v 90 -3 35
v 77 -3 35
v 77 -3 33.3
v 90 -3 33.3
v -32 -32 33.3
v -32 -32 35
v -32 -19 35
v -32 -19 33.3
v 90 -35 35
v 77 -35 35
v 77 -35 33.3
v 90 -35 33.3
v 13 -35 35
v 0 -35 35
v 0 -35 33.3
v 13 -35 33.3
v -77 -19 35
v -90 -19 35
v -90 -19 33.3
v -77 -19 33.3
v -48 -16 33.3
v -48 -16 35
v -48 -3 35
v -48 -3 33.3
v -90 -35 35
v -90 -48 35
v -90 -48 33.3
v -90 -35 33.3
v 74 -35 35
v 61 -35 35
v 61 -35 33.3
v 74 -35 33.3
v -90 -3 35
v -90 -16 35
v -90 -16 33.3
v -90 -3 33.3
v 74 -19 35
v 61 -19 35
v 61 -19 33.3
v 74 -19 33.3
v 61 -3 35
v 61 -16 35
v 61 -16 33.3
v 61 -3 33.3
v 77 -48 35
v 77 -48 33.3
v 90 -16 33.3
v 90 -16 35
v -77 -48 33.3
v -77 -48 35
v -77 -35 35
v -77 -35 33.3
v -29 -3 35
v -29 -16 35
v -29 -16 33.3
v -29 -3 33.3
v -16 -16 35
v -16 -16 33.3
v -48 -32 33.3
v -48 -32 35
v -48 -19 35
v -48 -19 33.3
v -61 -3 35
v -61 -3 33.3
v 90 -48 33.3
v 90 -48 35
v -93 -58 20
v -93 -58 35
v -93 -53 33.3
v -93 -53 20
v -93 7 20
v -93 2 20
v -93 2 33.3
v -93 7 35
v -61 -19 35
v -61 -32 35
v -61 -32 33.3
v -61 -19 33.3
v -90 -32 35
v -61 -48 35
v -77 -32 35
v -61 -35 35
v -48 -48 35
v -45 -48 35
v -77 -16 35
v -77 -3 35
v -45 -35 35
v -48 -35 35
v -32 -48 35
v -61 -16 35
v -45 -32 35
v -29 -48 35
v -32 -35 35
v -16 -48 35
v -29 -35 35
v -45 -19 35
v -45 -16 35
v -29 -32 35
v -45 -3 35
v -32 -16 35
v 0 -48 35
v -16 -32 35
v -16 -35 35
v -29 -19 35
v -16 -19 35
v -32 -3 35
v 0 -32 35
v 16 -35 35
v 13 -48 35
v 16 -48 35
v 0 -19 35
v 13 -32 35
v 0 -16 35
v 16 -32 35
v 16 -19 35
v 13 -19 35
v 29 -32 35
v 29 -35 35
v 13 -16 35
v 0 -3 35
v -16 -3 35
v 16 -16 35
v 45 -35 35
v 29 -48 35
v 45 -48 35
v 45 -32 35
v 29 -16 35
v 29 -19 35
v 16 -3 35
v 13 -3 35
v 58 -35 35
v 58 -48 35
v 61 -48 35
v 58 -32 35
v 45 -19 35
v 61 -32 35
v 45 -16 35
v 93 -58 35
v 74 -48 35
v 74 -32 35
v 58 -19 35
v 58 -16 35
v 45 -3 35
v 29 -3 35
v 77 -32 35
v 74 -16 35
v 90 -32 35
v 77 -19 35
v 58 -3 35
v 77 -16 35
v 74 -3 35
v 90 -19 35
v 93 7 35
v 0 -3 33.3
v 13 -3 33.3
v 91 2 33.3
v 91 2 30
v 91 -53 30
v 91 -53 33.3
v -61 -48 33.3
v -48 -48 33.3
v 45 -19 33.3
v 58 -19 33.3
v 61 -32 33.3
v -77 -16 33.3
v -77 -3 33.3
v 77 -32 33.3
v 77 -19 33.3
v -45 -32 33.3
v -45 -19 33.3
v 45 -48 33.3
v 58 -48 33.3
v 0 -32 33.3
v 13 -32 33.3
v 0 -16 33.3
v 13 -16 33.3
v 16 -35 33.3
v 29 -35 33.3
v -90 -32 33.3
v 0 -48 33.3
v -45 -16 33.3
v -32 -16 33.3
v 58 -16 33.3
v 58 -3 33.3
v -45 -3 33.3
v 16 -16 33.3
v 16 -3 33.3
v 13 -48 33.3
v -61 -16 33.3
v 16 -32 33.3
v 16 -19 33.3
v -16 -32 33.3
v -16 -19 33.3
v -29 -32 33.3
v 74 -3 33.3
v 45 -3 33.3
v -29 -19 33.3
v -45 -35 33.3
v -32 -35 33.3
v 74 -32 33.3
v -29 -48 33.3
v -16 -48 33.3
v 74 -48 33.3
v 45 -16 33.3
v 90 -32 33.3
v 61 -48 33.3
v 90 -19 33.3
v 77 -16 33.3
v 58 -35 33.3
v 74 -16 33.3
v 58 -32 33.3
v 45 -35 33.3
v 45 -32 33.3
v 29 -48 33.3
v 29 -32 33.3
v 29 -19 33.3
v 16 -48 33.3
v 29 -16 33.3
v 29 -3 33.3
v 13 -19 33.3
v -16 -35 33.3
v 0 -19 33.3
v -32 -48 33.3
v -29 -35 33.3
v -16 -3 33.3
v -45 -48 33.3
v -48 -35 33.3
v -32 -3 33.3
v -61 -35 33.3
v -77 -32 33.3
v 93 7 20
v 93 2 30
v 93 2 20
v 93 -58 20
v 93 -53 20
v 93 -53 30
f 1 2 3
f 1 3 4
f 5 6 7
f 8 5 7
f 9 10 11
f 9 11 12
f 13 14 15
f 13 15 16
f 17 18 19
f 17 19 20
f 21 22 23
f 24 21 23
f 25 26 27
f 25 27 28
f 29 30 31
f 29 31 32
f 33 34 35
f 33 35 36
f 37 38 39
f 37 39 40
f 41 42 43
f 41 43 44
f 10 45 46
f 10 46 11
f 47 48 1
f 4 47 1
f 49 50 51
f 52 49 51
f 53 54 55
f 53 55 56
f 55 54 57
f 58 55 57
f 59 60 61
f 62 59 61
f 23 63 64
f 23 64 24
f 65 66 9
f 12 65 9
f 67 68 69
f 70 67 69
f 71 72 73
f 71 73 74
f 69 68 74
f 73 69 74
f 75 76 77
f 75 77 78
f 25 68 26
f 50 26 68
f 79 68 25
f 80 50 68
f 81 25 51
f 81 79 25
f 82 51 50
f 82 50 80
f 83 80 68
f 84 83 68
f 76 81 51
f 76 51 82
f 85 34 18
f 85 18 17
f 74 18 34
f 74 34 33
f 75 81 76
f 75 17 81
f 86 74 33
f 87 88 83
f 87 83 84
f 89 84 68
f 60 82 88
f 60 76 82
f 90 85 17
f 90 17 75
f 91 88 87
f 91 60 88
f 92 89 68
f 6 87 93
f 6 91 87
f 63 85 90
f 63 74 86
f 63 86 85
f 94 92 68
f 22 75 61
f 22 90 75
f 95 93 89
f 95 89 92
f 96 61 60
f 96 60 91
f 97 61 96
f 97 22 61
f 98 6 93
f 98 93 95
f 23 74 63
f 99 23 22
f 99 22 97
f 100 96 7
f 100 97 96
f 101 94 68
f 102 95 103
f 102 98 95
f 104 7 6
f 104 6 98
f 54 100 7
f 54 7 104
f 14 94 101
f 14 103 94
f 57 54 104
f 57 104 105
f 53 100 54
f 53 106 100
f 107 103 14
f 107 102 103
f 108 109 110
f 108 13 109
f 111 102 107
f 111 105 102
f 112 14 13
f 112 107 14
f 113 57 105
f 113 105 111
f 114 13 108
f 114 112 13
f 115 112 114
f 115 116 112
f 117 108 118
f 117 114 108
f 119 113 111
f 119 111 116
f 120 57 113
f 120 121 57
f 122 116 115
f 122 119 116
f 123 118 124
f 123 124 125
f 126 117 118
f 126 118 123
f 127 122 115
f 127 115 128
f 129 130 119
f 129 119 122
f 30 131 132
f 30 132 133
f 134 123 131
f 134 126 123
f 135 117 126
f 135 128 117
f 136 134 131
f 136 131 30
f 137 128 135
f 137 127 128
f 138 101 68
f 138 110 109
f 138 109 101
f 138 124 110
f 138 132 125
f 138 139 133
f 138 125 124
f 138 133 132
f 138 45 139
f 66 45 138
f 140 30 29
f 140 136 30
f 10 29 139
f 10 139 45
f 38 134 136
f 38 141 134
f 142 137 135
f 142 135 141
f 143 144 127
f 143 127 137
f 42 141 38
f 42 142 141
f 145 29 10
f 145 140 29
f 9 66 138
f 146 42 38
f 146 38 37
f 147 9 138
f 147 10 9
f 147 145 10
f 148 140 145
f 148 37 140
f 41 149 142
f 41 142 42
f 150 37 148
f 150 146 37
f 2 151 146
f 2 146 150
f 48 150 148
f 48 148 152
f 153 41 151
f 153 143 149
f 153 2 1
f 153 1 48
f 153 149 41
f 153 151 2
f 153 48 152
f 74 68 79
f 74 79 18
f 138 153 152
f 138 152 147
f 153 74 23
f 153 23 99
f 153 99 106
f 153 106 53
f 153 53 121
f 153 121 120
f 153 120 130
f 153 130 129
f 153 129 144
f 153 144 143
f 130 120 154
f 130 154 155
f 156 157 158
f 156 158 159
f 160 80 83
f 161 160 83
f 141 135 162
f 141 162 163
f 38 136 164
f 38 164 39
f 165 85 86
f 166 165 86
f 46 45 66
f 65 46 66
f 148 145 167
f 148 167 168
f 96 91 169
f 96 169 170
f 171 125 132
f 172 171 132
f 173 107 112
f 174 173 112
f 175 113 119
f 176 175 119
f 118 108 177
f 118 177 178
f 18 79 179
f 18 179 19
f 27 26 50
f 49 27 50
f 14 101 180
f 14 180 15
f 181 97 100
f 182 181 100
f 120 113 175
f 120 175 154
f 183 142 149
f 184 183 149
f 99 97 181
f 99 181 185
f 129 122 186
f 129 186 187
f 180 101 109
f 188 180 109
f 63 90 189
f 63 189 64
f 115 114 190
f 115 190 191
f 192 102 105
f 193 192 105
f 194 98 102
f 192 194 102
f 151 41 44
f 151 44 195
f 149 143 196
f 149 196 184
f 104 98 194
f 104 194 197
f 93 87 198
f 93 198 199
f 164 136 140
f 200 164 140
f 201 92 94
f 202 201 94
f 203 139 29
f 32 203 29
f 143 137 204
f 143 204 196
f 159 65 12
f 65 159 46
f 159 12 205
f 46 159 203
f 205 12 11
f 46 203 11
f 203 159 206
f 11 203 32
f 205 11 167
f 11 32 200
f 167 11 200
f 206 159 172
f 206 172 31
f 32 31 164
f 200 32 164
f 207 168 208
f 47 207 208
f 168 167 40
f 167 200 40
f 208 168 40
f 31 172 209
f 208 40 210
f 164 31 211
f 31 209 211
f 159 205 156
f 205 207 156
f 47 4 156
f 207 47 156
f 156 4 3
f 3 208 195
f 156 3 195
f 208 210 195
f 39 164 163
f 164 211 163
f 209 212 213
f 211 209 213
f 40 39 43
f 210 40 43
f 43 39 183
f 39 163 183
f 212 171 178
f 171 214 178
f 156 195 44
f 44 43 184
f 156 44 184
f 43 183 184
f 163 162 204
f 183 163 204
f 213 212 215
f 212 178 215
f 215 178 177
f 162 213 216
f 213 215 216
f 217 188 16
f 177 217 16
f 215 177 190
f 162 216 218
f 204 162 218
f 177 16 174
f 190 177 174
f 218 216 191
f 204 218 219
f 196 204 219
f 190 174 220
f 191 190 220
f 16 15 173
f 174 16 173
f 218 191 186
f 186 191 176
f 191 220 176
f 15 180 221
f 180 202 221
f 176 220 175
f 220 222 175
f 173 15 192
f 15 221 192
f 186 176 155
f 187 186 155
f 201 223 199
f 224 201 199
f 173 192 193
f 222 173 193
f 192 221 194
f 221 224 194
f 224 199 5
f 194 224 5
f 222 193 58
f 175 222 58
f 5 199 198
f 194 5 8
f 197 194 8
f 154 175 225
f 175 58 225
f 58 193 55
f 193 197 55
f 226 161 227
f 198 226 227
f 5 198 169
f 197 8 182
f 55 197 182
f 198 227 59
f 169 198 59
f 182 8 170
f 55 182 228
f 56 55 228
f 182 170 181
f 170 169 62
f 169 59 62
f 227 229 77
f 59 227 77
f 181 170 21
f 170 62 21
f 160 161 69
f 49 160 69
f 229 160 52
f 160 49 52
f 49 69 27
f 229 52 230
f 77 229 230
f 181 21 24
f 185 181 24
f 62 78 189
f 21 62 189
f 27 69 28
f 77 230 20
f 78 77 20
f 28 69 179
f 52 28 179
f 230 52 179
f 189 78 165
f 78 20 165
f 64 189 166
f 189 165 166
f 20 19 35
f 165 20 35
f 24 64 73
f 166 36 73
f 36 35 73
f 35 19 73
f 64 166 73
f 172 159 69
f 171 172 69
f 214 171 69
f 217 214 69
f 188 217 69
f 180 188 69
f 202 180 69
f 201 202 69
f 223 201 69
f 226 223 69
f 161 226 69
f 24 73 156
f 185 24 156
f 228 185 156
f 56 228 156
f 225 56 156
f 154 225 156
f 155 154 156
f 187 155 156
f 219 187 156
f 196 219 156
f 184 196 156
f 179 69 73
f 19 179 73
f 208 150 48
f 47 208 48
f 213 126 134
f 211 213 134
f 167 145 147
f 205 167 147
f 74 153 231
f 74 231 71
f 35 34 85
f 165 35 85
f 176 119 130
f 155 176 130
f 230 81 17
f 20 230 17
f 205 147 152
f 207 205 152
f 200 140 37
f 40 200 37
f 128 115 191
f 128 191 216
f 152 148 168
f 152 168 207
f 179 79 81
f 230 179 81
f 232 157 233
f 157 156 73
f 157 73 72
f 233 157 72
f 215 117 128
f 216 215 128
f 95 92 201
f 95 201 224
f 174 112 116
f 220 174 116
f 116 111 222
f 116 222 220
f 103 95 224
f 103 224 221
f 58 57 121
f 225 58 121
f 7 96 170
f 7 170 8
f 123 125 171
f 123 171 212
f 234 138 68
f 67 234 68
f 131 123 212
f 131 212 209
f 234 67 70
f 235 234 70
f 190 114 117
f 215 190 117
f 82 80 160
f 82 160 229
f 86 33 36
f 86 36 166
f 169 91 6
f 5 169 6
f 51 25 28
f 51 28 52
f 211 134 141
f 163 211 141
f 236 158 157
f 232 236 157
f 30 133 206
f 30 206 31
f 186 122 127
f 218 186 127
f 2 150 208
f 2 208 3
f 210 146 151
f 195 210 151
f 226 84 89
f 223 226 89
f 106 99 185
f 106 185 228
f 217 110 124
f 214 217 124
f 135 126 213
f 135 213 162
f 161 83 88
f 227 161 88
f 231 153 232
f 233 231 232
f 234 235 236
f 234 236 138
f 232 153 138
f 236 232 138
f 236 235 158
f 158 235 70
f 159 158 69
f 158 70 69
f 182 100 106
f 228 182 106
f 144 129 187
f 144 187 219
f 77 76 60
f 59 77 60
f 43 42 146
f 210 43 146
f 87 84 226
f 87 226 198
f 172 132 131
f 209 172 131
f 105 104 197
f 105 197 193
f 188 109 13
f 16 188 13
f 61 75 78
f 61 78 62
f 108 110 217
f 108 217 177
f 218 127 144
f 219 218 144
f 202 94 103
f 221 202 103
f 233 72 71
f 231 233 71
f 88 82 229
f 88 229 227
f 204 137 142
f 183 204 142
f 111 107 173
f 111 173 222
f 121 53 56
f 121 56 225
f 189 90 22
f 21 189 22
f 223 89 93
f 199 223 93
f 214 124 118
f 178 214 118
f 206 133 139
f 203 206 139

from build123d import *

# Parameters (mm, degrees)
ESQUISSE1_W                     = 186
ESQUISSE1_H                     = 51
BOSS_EXTRU_1_DEPTH              = 35
ESQUISSE7_W                     = 13
ESQUISSE7_H                     = 13
ENL_V_MAT_EXTRU_5_DEPTH         = 91
R_P_TITION_LIN_AIRE5_COUNT      = 3
R_P_TITION_LIN_AIRE5_PITCH      = 16
ESQUISSE8_W                     = 13
ESQUISSE8_H                     = 13
ENL_V_MAT_EXTRU_6_DEPTH         = 103
R_P_TITION_LIN_AIRE6_COUNT      = 3
R_P_TITION_LIN_AIRE6_PITCH      = 16
R_P_TITION_LIN_AIRE6_COUNT_DIR2 = 3
R_P_TITION_LIN_AIRE6_PITCH_DIR2 = 16
ESQUISSE9_W                     = 13
ESQUISSE9_H                     = 13
ENL_V_MAT_EXTRU_7_DEPTH         = 77
R_P_TITION_LIN_AIRE7_COUNT      = 3
R_P_TITION_LIN_AIRE7_PITCH      = 16
R_P_TITION_LIN_AIRE7_COUNT_DIR2 = 2
R_P_TITION_LIN_AIRE7_PITCH_DIR2 = 16
ESQUISSE10_W                    = 13
ESQUISSE10_H                    = 13
ENL_V_MAT_EXTRU_8_DEPTH         = 78
R_P_TITION_LIN_AIRE8_COUNT      = 3
R_P_TITION_LIN_AIRE8_PITCH      = 16
R_P_TITION_LIN_AIRE8_COUNT_DIR2 = 3
R_P_TITION_LIN_AIRE8_PITCH_DIR2 = 16
ESQUISSE14_W                    = 10
ESQUISSE14_H                    = 5
BOSS_EXTRU_3_DEPTH              = 7
ESQUISSE25_W                    = 186
ESQUISSE25_H                    = 35
BOSS_EXTRU_7_DEPTH              = 7
ESQUISSE18_W                    = 186
ESQUISSE18_H                    = 35
BOSS_EXTRU_5_DEPTH              = 7
ESQUISSE16_W                    = 3.3
ESQUISSE16_H                    = 55
ENL_V_MAT_EXTRU_11_DEPTH        = 184
ESQUISSE15_R                    = 1
ENL_V_MAT_EXTRU_10_DEPTH        = 7
ESQUISSE24_W                    = 10
ESQUISSE24_H                    = 2
ENL_V_MAT_EXTRU_12_DEPTH        = 1
ESQUISSE19_W                    = 186
ESQUISSE19_H                    = 1
ESQUISSE19_W_2                  = 1
ESQUISSE19_H_2                  = 63
BOSS_EXTRU_8_DEPTH              = 30
ESQUISSE26_R                    = 1.75
ENL_V_MAT_EXTRU_14_DEPTH        = 30
ESQUISSE27_R                    = 1.75
ENL_V_MAT_EXTRU_20_DEPTH        = 198.952014387


with BuildPart() as part:
    # Esquisse1 → Boss.-Extru.1 (new body)
    with BuildSketch(Plane.XY):
        with Locations((0, -25.5)):
            Rectangle(ESQUISSE1_W, ESQUISSE1_H)
    extrude(amount=BOSS_EXTRU_1_DEPTH)

    # Esquisse7 → Enlèv. mat.-Extru.5 (cut)
    with BuildSketch(Plane.XY.offset(35)):
        with Locations((-83.5, -9.5)):
            Rectangle(ESQUISSE7_W, ESQUISSE7_H)
    enl_v_mat_extru_5 = extrude(amount=-ENL_V_MAT_EXTRU_5_DEPTH, mode=Mode.SUBTRACT)

    # Répétition linéaire5: Enlèv. mat.-Extru.5 ×3
    with Locations(*[(0, -i * R_P_TITION_LIN_AIRE5_PITCH, 0) for i in range(1, R_P_TITION_LIN_AIRE5_COUNT)]):
        add(enl_v_mat_extru_5, mode=Mode.SUBTRACT)

    # Esquisse8 → Enlèv. mat.-Extru.6 (cut)
    with BuildSketch(Plane.XY.offset(35)):
        with Locations((-54.5, -9.5)):
            Rectangle(ESQUISSE8_W, ESQUISSE8_H)
    enl_v_mat_extru_6 = extrude(amount=-ENL_V_MAT_EXTRU_6_DEPTH, mode=Mode.SUBTRACT)

    # Répétition linéaire6: Enl_v. mat.-Extru.6 3 × 3
    with Locations(*[(j * R_P_TITION_LIN_AIRE6_PITCH_DIR2, -i * R_P_TITION_LIN_AIRE6_PITCH, 0) for i in range(R_P_TITION_LIN_AIRE6_COUNT) for j in range(R_P_TITION_LIN_AIRE6_COUNT_DIR2) if (i, j) != (0, 0)]):
        add(enl_v_mat_extru_6, mode=Mode.SUBTRACT)

    # Esquisse9 → Enlèv. mat.-Extru.7 (cut)
    with BuildSketch(Plane.XY.offset(35)):
        with Locations((6.5, -9.5)):
            Rectangle(ESQUISSE9_W, ESQUISSE9_H)
    enl_v_mat_extru_7 = extrude(amount=-ENL_V_MAT_EXTRU_7_DEPTH, mode=Mode.SUBTRACT)

    # Répétition linéaire7: Enl_v. mat.-Extru.7 3 × 2
    with Locations(*[(j * R_P_TITION_LIN_AIRE7_PITCH_DIR2, -i * R_P_TITION_LIN_AIRE7_PITCH, 0) for i in range(R_P_TITION_LIN_AIRE7_COUNT) for j in range(R_P_TITION_LIN_AIRE7_COUNT_DIR2) if (i, j) != (0, 0)]):
        add(enl_v_mat_extru_7, mode=Mode.SUBTRACT)

    # Esquisse10 → Enlèv. mat.-Extru.8 (cut)
    with BuildSketch(Plane.XY.offset(35)):
        with Locations((51.5, -9.5)):
            Rectangle(ESQUISSE10_W, ESQUISSE10_H)
    enl_v_mat_extru_8 = extrude(amount=-ENL_V_MAT_EXTRU_8_DEPTH, mode=Mode.SUBTRACT)

    # Répétition linéaire8: Enl_v. mat.-Extru.8 3 × 3
    with Locations(*[(i * R_P_TITION_LIN_AIRE8_PITCH, -j * R_P_TITION_LIN_AIRE8_PITCH_DIR2, 0) for i in range(R_P_TITION_LIN_AIRE8_COUNT) for j in range(R_P_TITION_LIN_AIRE8_COUNT_DIR2) if (i, j) != (0, 0)]):
        add(enl_v_mat_extru_8, mode=Mode.SUBTRACT)

    # Esquisse14 → Boss.-Extru.3 (add)
    with BuildSketch(Plane.XZ.offset(51)):
        with Locations((-7.663083533, 2.5)):
            Rectangle(ESQUISSE14_W, ESQUISSE14_H)
    extrude(amount=BOSS_EXTRU_3_DEPTH)

    # Esquisse25 → Boss.-Extru.7 (add)
    with BuildSketch(Plane(origin=(0, 0, 0), x_dir=(1, 0, 0), z_dir=(0, 1, 0))):
        with Locations((0, -17.5)):
            Rectangle(ESQUISSE25_W, ESQUISSE25_H)
    extrude(amount=BOSS_EXTRU_7_DEPTH)

    # Esquisse18 → Boss.-Extru.5 (add)
    with BuildSketch(Plane.XZ.offset(51)):
        with Locations((0, 17.5)):
            Rectangle(ESQUISSE18_W, ESQUISSE18_H)
    extrude(amount=BOSS_EXTRU_5_DEPTH)

    # Esquisse16 → Enlèv. mat.-Extru.11 (cut)
    with BuildSketch(Plane.ZY.offset(93)):
        with Locations((31.65, -25.5)):
            Rectangle(ESQUISSE16_W, ESQUISSE16_H)
    extrude(amount=-ENL_V_MAT_EXTRU_11_DEPTH, mode=Mode.SUBTRACT)

    # Esquisse15 → Enlèv. mat.-Extru.10 (cut)
    with BuildSketch(Plane(origin=(0, 0, 0), x_dir=(-1, 0, 0), z_dir=(0, 0, -1))):
        with Locations((8.482305804, -42.446555864)):
            Circle(ESQUISSE15_R)
        with Locations((8.482305804, -9.749028666)):
            Circle(ESQUISSE15_R)
        with Locations((68.823038652, -42.446555864)):
            Circle(ESQUISSE15_R)
        with Locations((68.823038652, -9.749028666)):
            Circle(ESQUISSE15_R)
        with Locations((-37.13548256, -42.446555864)):
            Circle(ESQUISSE15_R)
        with Locations((-39.215855023, -11.260648292)):
            Circle(ESQUISSE15_R)
    extrude(amount=-ENL_V_MAT_EXTRU_10_DEPTH, mode=Mode.SUBTRACT)

    # Esquisse24 → Enlèv. mat.-Extru.12 (cut)
    with BuildSketch(Plane(origin=(0, 0, 0), x_dir=(-1, 0, 0), z_dir=(0, 0, -1))):
        with Locations((83.5, -49)):
            Rectangle(ESQUISSE24_W, ESQUISSE24_H)
        with Locations((54.5, -49)):
            Rectangle(ESQUISSE24_W, ESQUISSE24_H)
        with Locations((38.5, -49)):
            Rectangle(ESQUISSE24_W, ESQUISSE24_H)
        with Locations((22.5, -49)):
            Rectangle(ESQUISSE24_W, ESQUISSE24_H)
        with Locations((-6.5, -49)):
            Rectangle(ESQUISSE24_W, ESQUISSE24_H)
        with Locations((-22.5, -49)):
            Rectangle(ESQUISSE24_W, ESQUISSE24_H)
        with Locations((-51.5, -49)):
            Rectangle(ESQUISSE24_W, ESQUISSE24_H)
        with Locations((-67.5, -49)):
            Rectangle(ESQUISSE24_W, ESQUISSE24_H)
        with Locations((-83.5, -49)):
            Rectangle(ESQUISSE24_W, ESQUISSE24_H)
        with Locations((-83.5, -2)):
            Rectangle(ESQUISSE24_W, ESQUISSE24_H)
        with Locations((-67.5, -2)):
            Rectangle(ESQUISSE24_W, ESQUISSE24_H)
        with Locations((-51.5, -2)):
            Rectangle(ESQUISSE24_W, ESQUISSE24_H)
        with Locations((-22.5, -2)):
            Rectangle(ESQUISSE24_W, ESQUISSE24_H)
        with Locations((-6.5, -2)):
            Rectangle(ESQUISSE24_W, ESQUISSE24_H)
        with Locations((22.5, -2)):
            Rectangle(ESQUISSE24_W, ESQUISSE24_H)
        with Locations((38.5, -2)):
            Rectangle(ESQUISSE24_W, ESQUISSE24_H)
        with Locations((54.5, -2)):
            Rectangle(ESQUISSE24_W, ESQUISSE24_H)
        with Locations((83.5, -2)):
            Rectangle(ESQUISSE24_W, ESQUISSE24_H)
    extrude(amount=-ENL_V_MAT_EXTRU_12_DEPTH, mode=Mode.SUBTRACT)

    # Esquisse19 → Boss.-Extru.8 (add)
    with BuildSketch(Plane(origin=(0, 0, 0), x_dir=(-1, 0, 0), z_dir=(0, 0, -1))):
        with Locations((0, -57.5)):
            Rectangle(ESQUISSE19_W, ESQUISSE19_H)
        with Locations((92.5, -25.5)):
            Rectangle(ESQUISSE19_W_2, ESQUISSE19_H_2)
        with Locations((0, 6.5)):
            Rectangle(ESQUISSE19_W, ESQUISSE19_H)
        with Locations((-92.5, -25.5)):
            Rectangle(ESQUISSE19_W_2, ESQUISSE19_H_2)
    extrude(amount=BOSS_EXTRU_8_DEPTH)

    # Esquisse26 → Enlèv. mat.-Extru.14 (cut)
    with BuildSketch(Plane.ZY.offset(93)):
        with Locations((-13.75, -25.5)):
            Circle(ESQUISSE26_R)
    extrude(amount=-ENL_V_MAT_EXTRU_14_DEPTH, mode=Mode.SUBTRACT)

    # Esquisse27 → Enlèv. mat.-Extru.20 (cut, through all)
    # profile 1 of 2: a face of its own
    with BuildSketch(Plane.ZY.offset(93)):
        Polygon((30, -53), (30, 2), (20, 2), (20, 7), (-30, 7), (-30, -58), (20, -58), (20, -53), align=None)
        with Locations((-13.75, -25.5)):
            Circle(ESQUISSE27_R, mode=Mode.SUBTRACT)
    # profile 2 of 2: a face of its own
    with BuildSketch(Plane.ZY.offset(93)):
        with Locations((-13.75, -25.5)):
            Circle(ESQUISSE27_R)
    extrude(amount=-ENL_V_MAT_EXTRU_20_DEPTH, mode=Mode.SUBTRACT)


solid = part.part
